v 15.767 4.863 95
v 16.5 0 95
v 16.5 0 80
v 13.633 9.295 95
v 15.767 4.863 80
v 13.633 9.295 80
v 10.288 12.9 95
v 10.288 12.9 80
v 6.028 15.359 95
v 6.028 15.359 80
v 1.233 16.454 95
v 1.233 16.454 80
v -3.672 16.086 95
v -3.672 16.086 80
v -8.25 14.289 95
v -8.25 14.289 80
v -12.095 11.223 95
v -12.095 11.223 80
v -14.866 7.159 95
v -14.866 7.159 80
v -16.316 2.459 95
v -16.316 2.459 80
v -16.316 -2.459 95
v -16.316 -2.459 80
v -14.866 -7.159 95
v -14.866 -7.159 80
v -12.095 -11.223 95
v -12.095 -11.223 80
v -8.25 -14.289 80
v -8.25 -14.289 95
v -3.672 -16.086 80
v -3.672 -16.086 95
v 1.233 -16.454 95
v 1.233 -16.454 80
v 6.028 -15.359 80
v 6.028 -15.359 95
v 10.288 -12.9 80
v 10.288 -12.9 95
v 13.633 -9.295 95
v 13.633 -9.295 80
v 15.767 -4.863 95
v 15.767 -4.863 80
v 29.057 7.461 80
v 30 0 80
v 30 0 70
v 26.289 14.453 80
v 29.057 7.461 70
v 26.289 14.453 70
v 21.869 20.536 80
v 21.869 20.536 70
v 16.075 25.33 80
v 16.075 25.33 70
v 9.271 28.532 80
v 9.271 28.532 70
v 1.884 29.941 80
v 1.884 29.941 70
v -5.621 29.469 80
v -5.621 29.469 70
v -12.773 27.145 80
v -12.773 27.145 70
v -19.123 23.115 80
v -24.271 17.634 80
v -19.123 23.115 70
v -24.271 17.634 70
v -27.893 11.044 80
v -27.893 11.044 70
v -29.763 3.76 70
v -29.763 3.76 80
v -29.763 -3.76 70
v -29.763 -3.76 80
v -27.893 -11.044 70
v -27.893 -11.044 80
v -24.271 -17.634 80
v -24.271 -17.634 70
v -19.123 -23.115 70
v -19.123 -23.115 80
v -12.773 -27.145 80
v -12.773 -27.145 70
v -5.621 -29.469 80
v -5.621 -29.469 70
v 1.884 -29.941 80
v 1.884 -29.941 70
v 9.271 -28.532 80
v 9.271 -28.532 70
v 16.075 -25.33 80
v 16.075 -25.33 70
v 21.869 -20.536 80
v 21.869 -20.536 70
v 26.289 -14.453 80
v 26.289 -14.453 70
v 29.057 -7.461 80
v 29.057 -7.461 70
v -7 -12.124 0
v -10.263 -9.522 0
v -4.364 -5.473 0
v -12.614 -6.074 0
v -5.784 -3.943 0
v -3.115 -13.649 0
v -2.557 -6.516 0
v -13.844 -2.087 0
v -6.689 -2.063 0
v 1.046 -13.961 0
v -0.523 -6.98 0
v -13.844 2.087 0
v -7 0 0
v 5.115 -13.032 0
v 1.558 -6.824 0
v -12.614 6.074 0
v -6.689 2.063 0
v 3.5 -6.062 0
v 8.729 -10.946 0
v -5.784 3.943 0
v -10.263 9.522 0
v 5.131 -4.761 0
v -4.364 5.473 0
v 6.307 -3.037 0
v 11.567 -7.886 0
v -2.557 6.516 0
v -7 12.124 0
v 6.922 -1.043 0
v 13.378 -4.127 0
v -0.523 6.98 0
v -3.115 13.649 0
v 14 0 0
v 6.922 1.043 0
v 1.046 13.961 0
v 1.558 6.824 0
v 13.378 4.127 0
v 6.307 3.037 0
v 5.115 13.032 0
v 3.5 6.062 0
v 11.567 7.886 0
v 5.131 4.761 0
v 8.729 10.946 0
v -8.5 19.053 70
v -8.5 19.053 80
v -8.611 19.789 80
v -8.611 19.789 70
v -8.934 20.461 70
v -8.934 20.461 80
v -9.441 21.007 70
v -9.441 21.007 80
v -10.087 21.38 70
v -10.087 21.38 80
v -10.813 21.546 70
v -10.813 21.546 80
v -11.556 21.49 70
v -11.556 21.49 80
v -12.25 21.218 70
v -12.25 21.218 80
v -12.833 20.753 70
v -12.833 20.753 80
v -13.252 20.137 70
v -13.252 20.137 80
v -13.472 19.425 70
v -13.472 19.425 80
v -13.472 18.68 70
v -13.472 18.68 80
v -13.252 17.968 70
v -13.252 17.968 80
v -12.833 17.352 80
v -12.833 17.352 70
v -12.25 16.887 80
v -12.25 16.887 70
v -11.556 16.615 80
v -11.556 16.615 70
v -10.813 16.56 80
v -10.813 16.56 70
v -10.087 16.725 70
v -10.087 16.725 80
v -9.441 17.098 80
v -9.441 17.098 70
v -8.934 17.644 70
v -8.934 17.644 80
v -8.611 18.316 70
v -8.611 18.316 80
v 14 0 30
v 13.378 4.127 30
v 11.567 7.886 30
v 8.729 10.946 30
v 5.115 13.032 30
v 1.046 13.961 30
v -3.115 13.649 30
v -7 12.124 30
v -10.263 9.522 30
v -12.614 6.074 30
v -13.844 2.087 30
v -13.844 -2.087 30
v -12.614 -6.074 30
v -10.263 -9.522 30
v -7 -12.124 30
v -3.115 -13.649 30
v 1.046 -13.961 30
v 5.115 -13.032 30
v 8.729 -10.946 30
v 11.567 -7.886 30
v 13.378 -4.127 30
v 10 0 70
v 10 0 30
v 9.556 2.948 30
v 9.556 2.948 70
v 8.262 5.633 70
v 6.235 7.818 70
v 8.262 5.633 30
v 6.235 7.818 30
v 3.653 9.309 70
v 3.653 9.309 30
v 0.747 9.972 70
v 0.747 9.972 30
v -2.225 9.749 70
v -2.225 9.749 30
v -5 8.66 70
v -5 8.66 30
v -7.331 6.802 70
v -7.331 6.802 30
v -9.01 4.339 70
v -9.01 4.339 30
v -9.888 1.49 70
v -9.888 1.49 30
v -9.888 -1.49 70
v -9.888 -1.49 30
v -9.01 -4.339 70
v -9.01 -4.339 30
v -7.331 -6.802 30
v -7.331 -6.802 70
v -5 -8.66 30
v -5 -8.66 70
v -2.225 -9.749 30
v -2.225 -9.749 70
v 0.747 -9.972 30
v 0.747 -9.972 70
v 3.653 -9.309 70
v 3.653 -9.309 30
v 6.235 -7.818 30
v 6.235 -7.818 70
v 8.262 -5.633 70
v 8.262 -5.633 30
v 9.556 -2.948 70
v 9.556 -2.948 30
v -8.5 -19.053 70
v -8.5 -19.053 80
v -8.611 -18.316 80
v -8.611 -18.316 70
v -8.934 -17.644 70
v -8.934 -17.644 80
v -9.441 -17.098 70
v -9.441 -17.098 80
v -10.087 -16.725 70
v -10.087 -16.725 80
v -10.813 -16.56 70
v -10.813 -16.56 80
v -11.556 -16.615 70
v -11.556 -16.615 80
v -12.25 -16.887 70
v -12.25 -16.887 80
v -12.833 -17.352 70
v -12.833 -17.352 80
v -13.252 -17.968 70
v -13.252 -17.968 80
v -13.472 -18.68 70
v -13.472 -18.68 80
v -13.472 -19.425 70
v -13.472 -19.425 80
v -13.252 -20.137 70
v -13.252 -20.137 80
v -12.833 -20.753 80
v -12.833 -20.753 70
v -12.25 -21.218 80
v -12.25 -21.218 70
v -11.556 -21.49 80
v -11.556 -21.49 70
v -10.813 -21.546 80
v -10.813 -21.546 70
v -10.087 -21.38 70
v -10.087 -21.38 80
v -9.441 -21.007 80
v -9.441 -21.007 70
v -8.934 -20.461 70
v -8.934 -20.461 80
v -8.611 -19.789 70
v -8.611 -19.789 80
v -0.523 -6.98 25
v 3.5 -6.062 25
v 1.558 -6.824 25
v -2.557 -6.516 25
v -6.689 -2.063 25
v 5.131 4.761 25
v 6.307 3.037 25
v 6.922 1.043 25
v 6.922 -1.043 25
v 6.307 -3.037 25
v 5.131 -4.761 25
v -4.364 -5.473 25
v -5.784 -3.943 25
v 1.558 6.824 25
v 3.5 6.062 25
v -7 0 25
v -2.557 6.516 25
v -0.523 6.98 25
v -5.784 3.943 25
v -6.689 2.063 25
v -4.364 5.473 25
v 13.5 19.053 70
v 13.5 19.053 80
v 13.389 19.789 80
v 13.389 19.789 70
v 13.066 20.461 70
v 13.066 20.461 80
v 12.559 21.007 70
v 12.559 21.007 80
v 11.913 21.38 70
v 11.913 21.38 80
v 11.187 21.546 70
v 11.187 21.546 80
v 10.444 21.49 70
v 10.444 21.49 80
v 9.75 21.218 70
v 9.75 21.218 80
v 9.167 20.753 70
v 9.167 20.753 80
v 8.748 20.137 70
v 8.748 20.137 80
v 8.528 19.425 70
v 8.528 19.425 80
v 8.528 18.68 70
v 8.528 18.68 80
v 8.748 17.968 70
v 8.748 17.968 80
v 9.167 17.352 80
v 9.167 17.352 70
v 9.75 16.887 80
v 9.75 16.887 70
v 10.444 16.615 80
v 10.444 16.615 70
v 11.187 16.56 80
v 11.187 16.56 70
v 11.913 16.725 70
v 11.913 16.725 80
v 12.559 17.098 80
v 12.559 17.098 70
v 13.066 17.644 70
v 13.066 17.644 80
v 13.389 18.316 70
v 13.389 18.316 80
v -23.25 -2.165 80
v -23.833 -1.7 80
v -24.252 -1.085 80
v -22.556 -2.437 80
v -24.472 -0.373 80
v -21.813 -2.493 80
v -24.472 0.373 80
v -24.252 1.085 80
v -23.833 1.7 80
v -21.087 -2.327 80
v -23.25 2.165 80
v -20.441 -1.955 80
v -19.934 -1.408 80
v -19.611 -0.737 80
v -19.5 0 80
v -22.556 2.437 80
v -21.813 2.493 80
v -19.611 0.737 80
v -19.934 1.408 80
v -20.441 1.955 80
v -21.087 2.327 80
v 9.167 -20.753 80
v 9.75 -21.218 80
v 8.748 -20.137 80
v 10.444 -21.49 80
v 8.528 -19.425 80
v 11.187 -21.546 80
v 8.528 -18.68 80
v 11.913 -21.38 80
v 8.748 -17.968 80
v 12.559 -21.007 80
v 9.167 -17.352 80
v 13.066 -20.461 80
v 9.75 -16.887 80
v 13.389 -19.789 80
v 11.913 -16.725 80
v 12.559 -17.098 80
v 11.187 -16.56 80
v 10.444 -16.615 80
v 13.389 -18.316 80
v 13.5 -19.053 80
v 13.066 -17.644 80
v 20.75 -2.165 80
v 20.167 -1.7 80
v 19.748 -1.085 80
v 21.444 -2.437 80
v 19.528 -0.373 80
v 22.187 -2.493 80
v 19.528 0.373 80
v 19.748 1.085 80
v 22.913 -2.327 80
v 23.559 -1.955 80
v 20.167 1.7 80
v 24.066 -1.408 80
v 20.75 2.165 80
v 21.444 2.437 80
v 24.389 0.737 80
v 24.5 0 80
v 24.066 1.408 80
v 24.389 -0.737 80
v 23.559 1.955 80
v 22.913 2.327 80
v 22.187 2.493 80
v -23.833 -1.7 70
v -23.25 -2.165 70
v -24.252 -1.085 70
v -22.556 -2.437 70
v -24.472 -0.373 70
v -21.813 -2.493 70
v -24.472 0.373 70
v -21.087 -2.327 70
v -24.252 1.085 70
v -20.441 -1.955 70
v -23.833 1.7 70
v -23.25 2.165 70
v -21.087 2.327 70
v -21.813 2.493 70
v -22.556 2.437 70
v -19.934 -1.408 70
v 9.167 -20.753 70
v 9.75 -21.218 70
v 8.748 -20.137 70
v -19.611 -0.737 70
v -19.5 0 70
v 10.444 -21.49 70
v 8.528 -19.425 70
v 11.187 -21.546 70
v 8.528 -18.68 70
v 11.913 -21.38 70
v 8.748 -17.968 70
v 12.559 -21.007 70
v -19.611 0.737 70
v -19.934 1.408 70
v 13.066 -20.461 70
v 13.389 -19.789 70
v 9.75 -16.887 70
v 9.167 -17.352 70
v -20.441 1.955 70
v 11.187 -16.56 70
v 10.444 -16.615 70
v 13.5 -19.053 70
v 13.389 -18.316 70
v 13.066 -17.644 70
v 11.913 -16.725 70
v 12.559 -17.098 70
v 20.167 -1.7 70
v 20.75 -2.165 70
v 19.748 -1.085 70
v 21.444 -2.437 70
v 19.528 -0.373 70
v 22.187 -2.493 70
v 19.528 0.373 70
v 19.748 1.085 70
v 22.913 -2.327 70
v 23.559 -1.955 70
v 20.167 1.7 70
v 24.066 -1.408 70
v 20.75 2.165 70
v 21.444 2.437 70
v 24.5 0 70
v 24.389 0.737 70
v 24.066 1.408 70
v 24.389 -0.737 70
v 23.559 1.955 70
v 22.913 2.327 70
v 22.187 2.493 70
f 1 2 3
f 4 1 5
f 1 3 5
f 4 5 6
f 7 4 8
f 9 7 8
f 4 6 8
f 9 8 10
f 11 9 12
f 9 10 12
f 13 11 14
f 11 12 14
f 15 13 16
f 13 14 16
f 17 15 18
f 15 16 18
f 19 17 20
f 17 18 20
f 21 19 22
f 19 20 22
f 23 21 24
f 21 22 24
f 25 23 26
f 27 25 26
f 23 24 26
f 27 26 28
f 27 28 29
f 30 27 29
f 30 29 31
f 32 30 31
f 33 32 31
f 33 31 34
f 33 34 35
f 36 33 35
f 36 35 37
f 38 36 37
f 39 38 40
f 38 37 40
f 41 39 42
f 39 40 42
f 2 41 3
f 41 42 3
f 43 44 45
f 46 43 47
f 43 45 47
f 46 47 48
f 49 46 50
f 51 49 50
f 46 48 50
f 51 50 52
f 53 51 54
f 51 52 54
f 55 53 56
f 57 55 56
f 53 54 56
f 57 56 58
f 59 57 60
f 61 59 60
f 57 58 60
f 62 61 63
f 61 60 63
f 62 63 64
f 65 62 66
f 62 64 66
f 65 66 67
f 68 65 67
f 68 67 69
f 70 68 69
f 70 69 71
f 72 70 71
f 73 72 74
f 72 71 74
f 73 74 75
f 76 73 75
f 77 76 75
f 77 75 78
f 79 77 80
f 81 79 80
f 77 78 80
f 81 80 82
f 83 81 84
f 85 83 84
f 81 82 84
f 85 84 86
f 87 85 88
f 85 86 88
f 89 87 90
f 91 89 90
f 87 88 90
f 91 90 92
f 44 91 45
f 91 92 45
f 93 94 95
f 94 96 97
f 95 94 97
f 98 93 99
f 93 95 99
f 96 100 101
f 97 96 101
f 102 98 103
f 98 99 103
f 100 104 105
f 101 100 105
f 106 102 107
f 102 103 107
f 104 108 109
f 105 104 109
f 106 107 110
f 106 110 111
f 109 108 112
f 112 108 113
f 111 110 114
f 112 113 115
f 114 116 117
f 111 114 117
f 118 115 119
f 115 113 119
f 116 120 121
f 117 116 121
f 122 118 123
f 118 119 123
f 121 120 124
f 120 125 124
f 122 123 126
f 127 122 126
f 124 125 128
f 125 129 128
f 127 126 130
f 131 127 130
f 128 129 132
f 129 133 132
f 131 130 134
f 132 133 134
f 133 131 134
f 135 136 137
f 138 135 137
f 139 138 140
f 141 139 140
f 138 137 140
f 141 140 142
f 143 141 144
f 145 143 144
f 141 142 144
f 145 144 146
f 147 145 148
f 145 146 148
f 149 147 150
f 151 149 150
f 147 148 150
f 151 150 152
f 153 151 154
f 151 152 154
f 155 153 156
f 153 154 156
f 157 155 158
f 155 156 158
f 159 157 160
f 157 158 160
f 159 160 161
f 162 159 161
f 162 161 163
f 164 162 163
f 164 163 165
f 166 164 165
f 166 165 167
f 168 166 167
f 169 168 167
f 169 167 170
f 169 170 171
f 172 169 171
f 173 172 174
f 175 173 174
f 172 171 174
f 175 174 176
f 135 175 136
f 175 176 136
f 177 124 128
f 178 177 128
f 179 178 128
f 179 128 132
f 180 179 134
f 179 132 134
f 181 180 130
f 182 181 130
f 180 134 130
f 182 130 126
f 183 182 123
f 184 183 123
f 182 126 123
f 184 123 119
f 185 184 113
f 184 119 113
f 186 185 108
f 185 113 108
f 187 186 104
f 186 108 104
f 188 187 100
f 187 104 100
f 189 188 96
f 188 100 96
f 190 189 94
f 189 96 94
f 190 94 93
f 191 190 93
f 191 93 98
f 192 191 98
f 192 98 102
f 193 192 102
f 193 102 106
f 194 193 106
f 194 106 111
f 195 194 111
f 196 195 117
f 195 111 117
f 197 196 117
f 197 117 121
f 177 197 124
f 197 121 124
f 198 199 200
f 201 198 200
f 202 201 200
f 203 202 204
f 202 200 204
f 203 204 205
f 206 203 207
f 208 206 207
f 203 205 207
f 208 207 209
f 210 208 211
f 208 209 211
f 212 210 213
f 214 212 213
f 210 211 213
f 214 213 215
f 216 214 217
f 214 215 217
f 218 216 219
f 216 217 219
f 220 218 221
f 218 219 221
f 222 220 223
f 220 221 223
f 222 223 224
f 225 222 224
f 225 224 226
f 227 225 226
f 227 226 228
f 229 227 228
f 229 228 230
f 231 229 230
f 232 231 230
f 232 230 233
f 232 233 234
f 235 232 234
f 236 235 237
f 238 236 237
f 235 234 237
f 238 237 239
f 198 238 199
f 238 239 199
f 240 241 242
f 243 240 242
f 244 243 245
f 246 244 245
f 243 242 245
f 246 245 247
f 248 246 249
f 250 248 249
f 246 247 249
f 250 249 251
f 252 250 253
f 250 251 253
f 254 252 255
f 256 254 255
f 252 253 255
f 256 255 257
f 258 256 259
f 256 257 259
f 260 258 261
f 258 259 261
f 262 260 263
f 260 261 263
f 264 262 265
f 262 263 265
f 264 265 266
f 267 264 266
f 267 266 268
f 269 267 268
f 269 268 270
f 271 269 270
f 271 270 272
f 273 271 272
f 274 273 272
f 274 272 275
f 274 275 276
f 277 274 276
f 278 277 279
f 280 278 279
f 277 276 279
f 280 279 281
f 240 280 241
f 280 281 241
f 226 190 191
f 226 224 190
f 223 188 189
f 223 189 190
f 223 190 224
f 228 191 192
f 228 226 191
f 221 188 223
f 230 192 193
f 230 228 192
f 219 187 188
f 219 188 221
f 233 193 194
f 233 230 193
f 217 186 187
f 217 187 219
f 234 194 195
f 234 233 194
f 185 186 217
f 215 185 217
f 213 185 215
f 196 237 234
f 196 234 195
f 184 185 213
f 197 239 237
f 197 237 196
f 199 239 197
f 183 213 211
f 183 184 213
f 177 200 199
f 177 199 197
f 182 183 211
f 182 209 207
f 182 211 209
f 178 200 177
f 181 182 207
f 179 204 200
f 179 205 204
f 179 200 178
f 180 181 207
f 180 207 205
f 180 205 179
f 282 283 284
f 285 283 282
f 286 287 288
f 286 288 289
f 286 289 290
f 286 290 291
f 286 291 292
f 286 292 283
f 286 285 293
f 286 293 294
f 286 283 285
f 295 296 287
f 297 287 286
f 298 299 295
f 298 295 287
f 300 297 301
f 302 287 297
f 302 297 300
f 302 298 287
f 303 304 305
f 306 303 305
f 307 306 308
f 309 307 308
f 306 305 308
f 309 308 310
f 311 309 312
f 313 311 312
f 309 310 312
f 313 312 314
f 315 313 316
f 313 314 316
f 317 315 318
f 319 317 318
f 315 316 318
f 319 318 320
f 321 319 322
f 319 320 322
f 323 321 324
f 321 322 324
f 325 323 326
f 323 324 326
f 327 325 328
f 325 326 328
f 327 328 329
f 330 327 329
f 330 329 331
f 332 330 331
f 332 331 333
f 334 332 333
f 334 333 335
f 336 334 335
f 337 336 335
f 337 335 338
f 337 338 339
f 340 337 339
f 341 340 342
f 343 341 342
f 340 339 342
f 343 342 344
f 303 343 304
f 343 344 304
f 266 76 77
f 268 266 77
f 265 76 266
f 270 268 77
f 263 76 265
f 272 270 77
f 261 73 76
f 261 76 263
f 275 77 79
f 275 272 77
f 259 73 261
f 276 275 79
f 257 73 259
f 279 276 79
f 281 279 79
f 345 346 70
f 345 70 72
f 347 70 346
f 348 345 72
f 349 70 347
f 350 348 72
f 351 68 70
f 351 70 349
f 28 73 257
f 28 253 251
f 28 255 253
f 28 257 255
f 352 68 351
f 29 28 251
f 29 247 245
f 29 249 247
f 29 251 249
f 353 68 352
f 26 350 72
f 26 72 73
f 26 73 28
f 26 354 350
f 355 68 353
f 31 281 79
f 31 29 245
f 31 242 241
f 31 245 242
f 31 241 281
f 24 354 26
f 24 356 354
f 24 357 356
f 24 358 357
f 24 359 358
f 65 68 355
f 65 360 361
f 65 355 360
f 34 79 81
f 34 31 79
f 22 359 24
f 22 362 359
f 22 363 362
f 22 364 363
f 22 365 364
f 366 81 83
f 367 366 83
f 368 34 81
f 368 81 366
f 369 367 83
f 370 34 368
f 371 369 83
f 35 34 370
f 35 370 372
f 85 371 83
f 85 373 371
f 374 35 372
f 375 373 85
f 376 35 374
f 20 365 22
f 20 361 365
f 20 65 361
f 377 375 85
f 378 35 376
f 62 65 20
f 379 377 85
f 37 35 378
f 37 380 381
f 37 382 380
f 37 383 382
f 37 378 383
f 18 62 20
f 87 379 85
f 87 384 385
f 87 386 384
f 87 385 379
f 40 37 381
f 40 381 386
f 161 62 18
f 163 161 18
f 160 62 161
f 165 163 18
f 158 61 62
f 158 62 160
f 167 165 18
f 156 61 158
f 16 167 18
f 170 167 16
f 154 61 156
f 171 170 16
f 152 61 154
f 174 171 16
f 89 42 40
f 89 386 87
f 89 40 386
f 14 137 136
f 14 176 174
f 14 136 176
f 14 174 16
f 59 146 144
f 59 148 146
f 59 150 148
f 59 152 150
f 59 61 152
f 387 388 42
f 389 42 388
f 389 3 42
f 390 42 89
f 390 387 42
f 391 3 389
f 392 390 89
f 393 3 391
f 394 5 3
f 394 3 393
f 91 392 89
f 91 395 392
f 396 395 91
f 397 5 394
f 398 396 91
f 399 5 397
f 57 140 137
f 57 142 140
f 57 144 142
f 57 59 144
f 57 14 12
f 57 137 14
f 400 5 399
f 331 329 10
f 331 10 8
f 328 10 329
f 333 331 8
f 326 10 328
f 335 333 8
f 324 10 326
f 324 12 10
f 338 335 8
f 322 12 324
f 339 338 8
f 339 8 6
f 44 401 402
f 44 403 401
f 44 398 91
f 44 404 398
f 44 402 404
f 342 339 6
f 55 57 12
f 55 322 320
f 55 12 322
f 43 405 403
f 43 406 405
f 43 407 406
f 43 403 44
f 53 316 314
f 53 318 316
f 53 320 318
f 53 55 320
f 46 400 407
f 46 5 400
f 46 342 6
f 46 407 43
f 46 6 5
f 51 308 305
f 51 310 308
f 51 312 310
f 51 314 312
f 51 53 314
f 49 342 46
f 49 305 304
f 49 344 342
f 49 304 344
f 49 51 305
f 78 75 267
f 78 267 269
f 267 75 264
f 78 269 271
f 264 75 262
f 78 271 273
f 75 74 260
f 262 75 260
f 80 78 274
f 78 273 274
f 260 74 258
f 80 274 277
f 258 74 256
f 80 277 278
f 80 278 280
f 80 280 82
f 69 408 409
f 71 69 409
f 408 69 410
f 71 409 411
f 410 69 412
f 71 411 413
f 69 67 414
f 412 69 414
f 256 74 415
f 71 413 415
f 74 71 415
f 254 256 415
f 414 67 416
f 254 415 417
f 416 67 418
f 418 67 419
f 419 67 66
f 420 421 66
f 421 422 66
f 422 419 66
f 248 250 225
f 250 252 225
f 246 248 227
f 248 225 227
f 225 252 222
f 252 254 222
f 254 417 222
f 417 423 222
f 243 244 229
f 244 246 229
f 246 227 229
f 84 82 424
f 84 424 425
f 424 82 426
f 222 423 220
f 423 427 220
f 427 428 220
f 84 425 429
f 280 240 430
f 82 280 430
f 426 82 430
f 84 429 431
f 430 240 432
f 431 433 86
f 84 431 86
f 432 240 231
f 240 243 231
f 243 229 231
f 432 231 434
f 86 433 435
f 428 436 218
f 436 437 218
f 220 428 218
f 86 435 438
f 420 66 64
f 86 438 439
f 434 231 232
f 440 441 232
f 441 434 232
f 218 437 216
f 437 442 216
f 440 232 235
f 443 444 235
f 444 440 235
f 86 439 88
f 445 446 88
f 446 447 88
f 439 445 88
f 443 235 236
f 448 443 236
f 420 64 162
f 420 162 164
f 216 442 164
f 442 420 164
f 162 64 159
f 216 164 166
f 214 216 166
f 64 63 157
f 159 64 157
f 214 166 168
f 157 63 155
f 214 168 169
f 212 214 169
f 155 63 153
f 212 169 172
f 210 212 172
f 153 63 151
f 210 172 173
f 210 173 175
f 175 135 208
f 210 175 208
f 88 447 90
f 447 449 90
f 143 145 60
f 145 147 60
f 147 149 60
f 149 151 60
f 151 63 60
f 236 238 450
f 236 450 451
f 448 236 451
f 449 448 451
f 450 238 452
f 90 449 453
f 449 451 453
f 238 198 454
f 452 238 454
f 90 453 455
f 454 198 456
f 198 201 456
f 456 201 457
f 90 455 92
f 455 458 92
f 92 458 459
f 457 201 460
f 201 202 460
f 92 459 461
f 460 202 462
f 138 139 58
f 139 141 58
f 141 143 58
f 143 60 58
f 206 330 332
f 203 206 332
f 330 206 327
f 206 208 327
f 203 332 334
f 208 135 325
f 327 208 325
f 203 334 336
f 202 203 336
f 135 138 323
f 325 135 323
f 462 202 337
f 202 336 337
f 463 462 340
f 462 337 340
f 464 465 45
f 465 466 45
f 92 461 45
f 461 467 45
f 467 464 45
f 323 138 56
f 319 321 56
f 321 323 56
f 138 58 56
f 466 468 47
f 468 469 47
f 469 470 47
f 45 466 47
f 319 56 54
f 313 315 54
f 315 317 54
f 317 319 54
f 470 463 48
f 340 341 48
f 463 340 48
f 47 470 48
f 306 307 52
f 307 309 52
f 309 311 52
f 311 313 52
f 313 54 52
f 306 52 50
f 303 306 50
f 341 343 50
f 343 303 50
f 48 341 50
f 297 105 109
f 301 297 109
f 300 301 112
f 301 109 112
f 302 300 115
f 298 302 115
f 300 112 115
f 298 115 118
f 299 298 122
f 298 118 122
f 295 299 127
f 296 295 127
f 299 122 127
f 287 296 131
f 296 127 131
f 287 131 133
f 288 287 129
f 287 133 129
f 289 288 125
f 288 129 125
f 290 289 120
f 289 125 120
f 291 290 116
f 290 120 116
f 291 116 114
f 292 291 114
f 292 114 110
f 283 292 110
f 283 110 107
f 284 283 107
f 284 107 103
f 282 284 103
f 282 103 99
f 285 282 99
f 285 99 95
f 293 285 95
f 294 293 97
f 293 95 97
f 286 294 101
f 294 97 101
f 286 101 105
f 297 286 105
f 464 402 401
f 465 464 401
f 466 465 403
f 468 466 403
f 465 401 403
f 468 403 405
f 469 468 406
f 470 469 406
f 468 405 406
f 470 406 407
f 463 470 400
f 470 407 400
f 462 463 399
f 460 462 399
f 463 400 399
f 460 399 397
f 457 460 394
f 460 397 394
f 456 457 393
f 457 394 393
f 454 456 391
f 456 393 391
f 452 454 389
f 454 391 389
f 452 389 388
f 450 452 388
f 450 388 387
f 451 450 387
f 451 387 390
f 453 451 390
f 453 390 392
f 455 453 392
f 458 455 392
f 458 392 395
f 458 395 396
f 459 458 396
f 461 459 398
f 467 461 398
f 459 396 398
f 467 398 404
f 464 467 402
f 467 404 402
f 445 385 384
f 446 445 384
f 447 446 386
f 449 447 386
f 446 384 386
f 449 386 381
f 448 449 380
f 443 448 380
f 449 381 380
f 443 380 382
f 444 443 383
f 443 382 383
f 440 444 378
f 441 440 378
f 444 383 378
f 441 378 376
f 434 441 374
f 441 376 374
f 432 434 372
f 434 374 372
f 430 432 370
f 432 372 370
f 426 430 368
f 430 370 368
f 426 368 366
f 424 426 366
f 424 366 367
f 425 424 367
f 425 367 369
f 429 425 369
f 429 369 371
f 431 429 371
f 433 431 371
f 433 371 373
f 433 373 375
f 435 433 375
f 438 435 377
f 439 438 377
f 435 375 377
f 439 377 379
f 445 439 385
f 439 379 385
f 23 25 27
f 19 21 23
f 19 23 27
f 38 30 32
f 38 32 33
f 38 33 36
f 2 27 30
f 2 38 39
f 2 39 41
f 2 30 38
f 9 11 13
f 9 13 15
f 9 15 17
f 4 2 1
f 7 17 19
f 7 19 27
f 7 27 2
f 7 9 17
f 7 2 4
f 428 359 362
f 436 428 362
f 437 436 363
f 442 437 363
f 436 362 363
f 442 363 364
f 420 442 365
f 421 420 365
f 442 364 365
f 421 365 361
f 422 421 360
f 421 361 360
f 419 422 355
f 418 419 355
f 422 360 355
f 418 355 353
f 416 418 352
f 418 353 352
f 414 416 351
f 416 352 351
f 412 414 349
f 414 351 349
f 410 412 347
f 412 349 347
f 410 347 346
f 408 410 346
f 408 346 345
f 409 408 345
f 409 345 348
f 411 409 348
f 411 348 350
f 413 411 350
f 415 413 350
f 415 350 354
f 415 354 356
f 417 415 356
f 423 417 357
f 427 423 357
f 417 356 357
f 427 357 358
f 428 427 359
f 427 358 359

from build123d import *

# Parameters (mm, degrees)
SCHIZZO1_R                   = 14
ESTRUSIONE_ESTRUSIONE1_DEPTH = 30
SCHIZZO2_R                   = 10
ESTRUSIONE_ESTRUSIONE2_DEPTH = 40
SCHIZZO3_R                   = 30
ESTRUSIONE_ESTRUSIONE3_DEPTH = 10
SCHIZZO4_R                   = 16.5
ESTRUSIONE_ESTRUSIONE4_DEPTH = 15
SCHIZZO5_R                   = 7
TAGLIO_ESTRUSIONE1_DEPTH     = 25
SCHIZZO6_R                   = 2.5
TAGLIO_ESTRUSIONE2_DEPTH     = 10


with BuildPart() as part:
    # Schizzo1 → Estrusione-Estrusione1 (new body)
    with BuildSketch(Plane.XY):
        Circle(SCHIZZO1_R)
    extrude(amount=ESTRUSIONE_ESTRUSIONE1_DEPTH)

    # Schizzo2 → Estrusione-Estrusione2 (add)
    with BuildSketch(Plane.XY.offset(30)):
        Circle(SCHIZZO2_R)
    extrude(amount=ESTRUSIONE_ESTRUSIONE2_DEPTH)

    # Schizzo3 → Estrusione-Estrusione3 (add)
    with BuildSketch(Plane.XY.offset(70)):
        Circle(SCHIZZO3_R)
    extrude(amount=ESTRUSIONE_ESTRUSIONE3_DEPTH)

    # Schizzo4 → Estrusione-Estrusione4 (add)
    with BuildSketch(Plane.XY.offset(80)):
        Circle(SCHIZZO4_R)
    extrude(amount=ESTRUSIONE_ESTRUSIONE4_DEPTH)

    # Schizzo5 → Taglio-Estrusione1 (cut)
    with BuildSketch(Plane(origin=(0, 0, 0), x_dir=(-1, 0, 0), z_dir=(0, 0, -1))):
        Circle(SCHIZZO5_R)
    extrude(amount=-TAGLIO_ESTRUSIONE1_DEPTH, mode=Mode.SUBTRACT)

    # Schizzo6 → Taglio-Estrusione2 (cut)
    with BuildSketch(Plane.XY.offset(80)):
        with Locations((22, 0)):
            Circle(SCHIZZO6_R)
        with Locations((11, 19.052558883)):
            Circle(SCHIZZO6_R)
        with Locations((-11, 19.052558883)):
            Circle(SCHIZZO6_R)
        with Locations((-22, 0)):
            Circle(SCHIZZO6_R)
        with Locations((-11, -19.052558883)):
            Circle(SCHIZZO6_R)
        with Locations((11, -19.052558883)):
            Circle(SCHIZZO6_R)
    extrude(amount=-TAGLIO_ESTRUSIONE2_DEPTH, mode=Mode.SUBTRACT)


solid = part.part
